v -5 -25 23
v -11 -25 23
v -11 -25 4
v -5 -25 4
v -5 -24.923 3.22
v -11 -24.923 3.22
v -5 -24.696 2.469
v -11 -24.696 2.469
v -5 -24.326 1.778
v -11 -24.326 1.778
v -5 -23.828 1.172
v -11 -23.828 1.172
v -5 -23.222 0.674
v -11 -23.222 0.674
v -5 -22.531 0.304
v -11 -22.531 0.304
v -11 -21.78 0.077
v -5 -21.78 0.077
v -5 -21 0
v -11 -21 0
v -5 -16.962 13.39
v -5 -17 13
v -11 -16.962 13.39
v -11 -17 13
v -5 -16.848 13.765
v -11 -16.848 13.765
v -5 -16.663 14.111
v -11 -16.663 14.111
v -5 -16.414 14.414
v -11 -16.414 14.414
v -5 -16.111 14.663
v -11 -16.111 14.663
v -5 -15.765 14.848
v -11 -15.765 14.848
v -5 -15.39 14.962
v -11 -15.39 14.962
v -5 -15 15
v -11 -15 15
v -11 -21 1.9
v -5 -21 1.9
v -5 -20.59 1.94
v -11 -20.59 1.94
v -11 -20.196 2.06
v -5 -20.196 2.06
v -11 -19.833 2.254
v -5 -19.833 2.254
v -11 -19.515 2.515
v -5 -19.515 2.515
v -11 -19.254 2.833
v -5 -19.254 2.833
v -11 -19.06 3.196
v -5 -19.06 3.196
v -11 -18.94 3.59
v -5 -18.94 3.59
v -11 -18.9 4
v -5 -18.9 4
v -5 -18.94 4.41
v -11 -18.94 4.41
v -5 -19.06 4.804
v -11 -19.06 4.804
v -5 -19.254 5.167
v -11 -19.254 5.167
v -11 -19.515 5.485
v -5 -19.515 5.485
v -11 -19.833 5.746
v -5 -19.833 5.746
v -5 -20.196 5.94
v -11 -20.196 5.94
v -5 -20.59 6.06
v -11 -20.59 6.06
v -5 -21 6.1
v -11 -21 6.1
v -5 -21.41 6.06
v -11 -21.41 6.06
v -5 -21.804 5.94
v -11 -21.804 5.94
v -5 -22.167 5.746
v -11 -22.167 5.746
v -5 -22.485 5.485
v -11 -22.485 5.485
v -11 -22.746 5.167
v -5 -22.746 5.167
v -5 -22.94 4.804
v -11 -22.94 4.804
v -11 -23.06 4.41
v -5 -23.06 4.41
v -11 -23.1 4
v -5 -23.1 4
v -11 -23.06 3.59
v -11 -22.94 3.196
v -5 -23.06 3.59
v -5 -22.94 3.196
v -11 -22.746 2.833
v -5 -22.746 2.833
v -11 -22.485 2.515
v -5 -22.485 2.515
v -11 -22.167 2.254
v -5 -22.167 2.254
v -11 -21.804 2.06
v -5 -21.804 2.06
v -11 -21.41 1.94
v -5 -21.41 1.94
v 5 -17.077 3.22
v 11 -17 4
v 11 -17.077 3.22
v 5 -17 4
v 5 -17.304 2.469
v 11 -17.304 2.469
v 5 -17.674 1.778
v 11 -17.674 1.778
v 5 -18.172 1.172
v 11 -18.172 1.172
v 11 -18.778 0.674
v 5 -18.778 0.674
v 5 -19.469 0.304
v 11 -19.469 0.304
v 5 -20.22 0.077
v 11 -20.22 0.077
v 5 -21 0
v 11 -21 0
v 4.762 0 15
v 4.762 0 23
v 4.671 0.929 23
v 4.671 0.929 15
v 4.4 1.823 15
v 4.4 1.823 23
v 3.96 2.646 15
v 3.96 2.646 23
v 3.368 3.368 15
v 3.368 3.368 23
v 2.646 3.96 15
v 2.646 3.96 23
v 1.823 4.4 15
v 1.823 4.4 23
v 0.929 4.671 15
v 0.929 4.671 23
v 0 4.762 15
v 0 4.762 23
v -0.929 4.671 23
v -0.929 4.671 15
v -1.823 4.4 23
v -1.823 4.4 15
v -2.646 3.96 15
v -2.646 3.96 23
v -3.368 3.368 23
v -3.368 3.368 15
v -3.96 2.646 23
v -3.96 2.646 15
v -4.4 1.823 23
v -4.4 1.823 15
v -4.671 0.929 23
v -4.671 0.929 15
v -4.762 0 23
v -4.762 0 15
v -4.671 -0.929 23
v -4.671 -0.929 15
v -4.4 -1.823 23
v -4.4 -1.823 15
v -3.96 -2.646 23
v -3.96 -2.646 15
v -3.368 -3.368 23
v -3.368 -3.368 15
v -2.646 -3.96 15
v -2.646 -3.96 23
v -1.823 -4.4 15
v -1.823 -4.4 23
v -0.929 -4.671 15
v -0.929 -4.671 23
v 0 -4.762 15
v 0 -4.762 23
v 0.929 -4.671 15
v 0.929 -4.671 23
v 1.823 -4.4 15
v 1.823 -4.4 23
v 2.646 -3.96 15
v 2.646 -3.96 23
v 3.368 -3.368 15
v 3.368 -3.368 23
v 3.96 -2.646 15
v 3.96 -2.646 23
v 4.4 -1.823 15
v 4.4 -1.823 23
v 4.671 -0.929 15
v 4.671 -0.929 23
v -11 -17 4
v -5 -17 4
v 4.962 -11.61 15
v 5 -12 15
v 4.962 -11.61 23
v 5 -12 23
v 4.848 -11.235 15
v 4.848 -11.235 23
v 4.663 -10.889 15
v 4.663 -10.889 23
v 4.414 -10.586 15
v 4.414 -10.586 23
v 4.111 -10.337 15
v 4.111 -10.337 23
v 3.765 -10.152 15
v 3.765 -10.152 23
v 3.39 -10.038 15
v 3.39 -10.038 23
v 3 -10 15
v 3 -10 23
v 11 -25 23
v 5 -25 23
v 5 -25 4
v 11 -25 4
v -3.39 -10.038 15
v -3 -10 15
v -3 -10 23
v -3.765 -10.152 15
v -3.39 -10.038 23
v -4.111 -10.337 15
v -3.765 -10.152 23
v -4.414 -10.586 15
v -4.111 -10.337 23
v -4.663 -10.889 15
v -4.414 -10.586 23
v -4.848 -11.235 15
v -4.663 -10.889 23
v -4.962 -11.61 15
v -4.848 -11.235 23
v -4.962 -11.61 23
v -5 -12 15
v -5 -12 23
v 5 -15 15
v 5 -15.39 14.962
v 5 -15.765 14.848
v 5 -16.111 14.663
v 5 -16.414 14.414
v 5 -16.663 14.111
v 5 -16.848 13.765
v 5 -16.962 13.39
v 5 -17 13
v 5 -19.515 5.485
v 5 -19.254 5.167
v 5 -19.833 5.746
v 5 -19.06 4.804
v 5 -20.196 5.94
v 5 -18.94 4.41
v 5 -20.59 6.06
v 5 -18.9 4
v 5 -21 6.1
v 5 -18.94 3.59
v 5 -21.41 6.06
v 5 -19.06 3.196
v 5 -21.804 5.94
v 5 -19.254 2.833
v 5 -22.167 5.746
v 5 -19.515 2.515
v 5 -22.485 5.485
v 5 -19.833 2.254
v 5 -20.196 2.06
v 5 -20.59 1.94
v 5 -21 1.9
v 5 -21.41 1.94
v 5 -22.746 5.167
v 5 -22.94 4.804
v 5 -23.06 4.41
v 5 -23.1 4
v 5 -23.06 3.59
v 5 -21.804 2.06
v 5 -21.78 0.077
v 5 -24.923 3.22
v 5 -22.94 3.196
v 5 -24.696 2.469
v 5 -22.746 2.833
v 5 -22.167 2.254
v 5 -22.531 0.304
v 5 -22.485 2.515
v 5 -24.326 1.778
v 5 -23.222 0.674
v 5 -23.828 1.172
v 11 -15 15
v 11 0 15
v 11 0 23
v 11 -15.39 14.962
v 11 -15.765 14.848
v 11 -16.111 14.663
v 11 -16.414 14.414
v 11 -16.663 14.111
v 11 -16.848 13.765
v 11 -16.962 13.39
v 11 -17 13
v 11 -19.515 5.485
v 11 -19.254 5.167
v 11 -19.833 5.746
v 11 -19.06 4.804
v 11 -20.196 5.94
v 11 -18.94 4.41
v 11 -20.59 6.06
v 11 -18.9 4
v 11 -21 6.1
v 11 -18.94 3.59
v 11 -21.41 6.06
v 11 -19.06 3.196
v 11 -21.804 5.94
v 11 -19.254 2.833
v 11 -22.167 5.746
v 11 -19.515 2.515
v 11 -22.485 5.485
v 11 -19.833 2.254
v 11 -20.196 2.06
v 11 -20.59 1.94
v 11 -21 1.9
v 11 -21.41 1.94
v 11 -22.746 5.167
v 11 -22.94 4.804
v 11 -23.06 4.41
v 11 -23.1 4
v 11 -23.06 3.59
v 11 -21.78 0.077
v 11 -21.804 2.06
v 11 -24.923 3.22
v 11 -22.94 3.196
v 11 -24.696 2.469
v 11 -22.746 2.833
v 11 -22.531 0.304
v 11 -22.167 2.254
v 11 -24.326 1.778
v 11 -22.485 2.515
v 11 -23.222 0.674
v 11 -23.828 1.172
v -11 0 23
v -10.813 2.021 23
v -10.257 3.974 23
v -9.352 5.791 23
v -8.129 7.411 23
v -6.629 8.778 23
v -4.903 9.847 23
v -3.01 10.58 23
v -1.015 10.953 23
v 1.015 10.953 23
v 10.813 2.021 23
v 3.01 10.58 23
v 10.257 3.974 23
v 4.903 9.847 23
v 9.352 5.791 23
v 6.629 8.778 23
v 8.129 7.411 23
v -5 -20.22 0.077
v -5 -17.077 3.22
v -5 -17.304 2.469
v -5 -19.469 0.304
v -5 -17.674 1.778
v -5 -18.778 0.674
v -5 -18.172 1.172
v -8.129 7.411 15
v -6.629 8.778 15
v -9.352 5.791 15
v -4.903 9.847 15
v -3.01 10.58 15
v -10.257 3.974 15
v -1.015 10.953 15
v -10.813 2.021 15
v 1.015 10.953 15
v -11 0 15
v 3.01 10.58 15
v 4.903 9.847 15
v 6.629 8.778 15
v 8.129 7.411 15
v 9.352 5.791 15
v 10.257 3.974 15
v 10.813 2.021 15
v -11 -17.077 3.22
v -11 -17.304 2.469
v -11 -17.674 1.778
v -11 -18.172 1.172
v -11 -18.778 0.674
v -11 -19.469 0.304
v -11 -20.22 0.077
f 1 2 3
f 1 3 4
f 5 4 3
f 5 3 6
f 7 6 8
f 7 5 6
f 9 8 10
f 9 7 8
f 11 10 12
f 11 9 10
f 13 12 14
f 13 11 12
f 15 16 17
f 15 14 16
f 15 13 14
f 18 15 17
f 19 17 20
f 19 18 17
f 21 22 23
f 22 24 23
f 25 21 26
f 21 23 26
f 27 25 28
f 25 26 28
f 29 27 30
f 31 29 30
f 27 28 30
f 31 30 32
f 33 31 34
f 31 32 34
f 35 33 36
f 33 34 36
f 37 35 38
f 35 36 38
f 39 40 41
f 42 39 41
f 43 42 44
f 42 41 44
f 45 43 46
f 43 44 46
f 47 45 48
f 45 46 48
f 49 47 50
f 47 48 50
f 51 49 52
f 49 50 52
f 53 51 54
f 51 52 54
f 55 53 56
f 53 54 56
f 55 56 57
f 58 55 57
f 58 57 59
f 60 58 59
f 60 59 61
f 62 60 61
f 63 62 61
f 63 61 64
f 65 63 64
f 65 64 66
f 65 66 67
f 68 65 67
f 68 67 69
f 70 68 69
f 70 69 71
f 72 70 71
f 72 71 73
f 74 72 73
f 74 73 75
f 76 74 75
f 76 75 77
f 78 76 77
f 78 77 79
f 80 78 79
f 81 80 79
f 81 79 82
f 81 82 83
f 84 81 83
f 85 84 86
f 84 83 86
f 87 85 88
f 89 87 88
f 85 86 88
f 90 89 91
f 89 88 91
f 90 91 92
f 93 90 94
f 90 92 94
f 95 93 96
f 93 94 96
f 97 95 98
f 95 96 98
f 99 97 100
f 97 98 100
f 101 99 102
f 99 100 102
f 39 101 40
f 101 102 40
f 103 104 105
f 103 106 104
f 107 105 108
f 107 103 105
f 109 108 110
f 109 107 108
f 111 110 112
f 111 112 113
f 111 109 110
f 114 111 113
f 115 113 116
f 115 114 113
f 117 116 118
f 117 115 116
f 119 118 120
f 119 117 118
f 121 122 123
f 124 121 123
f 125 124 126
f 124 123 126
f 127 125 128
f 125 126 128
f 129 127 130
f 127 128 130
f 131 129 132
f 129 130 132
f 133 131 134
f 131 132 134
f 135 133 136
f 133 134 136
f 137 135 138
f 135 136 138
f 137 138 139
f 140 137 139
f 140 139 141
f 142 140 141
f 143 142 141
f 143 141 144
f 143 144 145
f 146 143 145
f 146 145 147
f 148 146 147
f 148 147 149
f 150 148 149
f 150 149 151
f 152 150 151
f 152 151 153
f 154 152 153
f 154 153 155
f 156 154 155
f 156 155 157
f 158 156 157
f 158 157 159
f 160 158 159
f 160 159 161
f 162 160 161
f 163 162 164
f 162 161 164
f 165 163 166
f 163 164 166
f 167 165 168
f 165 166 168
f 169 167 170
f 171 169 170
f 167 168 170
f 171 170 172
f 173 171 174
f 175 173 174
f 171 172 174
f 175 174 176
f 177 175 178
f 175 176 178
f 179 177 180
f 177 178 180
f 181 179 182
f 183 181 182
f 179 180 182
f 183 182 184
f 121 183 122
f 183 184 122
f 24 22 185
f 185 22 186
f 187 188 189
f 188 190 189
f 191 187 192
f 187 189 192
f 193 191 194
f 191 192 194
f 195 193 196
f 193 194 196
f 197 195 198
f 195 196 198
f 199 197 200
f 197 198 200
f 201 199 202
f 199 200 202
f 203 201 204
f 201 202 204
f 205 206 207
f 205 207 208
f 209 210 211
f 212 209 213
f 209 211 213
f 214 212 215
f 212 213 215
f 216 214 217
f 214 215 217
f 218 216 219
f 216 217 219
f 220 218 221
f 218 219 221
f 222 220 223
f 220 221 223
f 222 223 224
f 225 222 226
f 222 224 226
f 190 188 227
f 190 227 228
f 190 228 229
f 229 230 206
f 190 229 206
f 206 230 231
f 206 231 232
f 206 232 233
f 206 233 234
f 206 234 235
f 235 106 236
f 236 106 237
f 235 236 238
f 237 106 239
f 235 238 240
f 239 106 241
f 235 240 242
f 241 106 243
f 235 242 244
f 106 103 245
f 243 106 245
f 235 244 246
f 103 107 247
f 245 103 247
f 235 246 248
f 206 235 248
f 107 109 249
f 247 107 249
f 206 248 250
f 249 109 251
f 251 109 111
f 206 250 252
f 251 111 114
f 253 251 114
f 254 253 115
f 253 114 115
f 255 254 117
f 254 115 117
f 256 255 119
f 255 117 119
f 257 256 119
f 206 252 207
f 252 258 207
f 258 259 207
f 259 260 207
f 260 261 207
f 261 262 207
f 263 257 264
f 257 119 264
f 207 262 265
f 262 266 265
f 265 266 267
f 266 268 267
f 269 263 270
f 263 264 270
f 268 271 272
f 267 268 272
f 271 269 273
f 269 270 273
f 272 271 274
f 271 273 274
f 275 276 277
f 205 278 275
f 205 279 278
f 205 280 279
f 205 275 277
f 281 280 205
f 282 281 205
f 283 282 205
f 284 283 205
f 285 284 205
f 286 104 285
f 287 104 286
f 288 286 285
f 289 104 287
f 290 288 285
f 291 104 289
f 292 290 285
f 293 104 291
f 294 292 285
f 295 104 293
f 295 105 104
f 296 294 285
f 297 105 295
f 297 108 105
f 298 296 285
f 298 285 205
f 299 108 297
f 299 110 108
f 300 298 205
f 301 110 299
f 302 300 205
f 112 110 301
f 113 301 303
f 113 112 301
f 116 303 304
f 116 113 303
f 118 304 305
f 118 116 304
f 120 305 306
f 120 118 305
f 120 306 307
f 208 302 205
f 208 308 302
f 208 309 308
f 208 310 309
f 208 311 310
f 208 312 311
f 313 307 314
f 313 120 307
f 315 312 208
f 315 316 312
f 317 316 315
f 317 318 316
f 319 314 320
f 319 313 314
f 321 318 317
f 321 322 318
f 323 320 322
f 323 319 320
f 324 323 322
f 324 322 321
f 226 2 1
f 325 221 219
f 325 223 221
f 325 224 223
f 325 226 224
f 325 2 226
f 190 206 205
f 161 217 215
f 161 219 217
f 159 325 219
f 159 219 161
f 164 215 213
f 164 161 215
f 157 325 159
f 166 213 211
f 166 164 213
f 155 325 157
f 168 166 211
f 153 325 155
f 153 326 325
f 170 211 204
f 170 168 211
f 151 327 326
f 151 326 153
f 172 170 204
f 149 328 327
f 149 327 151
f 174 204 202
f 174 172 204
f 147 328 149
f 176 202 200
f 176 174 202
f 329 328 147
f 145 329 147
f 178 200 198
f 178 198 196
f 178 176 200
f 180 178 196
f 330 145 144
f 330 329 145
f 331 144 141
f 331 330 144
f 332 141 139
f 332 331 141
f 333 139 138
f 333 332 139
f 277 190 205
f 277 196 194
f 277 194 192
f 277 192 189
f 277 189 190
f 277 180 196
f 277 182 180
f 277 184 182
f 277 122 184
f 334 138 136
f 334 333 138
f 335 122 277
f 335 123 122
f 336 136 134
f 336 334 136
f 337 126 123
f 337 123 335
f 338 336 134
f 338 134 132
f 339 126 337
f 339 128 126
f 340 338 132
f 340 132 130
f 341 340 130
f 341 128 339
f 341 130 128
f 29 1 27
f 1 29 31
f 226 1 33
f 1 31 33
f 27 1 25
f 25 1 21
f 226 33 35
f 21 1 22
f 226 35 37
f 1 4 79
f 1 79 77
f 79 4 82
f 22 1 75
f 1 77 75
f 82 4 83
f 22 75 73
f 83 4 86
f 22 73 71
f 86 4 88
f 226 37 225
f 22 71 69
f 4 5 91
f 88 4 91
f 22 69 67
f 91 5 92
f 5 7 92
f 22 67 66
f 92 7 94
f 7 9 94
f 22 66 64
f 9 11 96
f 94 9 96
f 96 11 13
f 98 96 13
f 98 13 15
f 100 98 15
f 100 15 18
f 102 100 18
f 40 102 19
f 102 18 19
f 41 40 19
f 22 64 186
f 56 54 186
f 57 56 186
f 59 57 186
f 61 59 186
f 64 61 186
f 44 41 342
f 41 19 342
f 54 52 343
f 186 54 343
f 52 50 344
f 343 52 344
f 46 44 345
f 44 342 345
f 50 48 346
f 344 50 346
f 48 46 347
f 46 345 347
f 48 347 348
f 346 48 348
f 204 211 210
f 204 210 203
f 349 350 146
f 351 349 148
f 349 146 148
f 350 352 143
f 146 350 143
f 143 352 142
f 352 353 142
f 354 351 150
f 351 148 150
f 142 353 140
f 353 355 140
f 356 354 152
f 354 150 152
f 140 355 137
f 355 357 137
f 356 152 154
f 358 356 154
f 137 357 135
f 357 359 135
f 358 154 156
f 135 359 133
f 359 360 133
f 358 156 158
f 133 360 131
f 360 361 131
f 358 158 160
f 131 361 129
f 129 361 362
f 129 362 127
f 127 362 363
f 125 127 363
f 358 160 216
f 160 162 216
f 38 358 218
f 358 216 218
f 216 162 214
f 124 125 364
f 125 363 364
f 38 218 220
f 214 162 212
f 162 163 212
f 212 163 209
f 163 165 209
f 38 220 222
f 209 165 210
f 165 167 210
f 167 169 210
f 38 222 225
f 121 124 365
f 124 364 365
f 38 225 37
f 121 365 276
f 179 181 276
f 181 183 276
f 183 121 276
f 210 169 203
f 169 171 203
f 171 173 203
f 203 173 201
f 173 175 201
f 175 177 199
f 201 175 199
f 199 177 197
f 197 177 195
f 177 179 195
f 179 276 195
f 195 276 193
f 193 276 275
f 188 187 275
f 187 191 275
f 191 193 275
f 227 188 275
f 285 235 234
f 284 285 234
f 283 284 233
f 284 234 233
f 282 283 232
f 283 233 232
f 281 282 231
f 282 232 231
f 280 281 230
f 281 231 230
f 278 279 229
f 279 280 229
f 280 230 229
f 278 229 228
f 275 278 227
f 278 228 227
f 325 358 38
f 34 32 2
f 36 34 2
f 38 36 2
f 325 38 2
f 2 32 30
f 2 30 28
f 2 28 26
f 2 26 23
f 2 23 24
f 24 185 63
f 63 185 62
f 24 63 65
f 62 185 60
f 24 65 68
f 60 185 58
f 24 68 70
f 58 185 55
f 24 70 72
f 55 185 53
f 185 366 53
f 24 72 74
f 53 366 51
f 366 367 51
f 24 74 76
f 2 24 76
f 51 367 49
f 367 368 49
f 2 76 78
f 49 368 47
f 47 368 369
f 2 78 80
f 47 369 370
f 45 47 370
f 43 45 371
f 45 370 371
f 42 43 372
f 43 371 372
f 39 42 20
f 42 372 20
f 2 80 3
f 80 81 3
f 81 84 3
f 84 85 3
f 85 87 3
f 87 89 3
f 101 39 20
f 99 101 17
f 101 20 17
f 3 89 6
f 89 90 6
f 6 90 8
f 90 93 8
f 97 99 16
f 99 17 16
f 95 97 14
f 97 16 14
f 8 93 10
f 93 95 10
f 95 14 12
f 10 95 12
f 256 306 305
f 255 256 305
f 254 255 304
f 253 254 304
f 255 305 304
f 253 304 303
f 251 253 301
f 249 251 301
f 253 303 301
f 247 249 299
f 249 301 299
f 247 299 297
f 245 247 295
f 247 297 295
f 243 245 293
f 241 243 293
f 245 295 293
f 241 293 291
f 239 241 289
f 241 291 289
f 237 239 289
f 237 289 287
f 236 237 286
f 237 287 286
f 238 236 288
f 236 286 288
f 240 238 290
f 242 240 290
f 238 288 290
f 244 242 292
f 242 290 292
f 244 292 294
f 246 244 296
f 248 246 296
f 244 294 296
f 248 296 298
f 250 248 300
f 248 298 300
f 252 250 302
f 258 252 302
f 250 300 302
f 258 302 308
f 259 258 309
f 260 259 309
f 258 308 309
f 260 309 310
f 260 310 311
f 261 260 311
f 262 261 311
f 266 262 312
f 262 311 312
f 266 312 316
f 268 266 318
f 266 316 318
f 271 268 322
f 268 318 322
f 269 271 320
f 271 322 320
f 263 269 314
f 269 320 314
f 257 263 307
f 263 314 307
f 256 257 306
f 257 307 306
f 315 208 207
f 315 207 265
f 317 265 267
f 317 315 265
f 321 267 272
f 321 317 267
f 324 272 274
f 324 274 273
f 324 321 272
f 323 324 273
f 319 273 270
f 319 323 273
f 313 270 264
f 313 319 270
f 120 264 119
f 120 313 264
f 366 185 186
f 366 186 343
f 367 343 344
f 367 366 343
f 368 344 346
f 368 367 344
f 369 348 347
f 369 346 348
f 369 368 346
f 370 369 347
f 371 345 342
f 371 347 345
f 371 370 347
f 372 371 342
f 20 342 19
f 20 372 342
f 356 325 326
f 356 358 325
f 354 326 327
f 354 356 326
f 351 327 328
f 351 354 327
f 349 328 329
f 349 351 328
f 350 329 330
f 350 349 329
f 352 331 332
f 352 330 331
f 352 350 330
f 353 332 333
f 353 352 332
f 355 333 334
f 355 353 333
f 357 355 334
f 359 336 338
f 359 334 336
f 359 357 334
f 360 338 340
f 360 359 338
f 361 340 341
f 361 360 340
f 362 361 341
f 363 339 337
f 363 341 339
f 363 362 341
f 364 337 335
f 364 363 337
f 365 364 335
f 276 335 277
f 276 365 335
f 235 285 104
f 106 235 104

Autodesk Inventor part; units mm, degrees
ref_plane "YZ Plane" through (0, 0, 0) normal (1, 0, 0) x (0, 1, 0)
ref_plane "XZ Plane" through (0, 0, 0) normal (0, 1, 0) x (-1, 0, 0)
ref_plane "XY Plane" through (0, 0, 0) normal (0, 0, 1) x (1, 0, 0)
sketch "Sketch1" plane through (0, 0, 0) normal (0, 0, 1) x (1, 0, 0)
  circle A0 centre (0, 0) radius 5
  circle A1 centre (0, 0) radius 11
  line L0 (-11, 0) -> (-11, -25)
  line L1 (11, 0) -> (11, -25)
  line L2 (0, 0) -> (0, -54.7816)
  line L3 (-11, -25) -> (-5, -25)
  line L4 (-5, -25) -> (-5, -10)
  line L5 (5, -10) -> (5, -25)
  line L6 (5, -25) -> (11, -25)
  line L7 (-5, -10) -> (5, -10)
  dimension "d0" = 10
  dimension "d1" = 22
  dimension "d4" = 10
  dimension "d6" = 15
  dimension "d22" = 6
  dimension "d23" = 6
extrude "Extrusion1" add sketch "Sketch1" along normal blind 23 contours A0 | A1 L7 | L1 L6 L5 L7 A1 | A1 L7 L4 L3 L0
sketch "Sketch2" plane through (11, -25, 0) normal (1, 0, 0) x (0, 0, -1)
  circle A0 centre (-4, 4) radius 2.1
  line L0 (0, 0) -> (0, 25) projected
  line L1 (0, 25) -> (-23, 25) projected
  line L2 (-23, 0) -> (-23, 25) projected
  line L3 (0, 0) -> (-23, 0) projected
  dimension "d9" = 4.2
  dimension "d10" = 4
  dimension "d20" = 4
extrude "Extrusion2" cut sketch "Sketch2" against normal through all contours A0
fillet "Fillet1" radius 2 2 edges at (-5, -10, 11.5) (5, -10, 11.5)
sketch "Sketch5" plane through (11, -25, 0) normal (1, 0, 0) x (0, 0, -1)
  circle A0 centre (-4, 4) radius 2.1 projected
  line L0 (0, 0) -> (0, 25) projected
  line L1 (0, 25) -> (-23, 25) projected
  line L2 (-23, 0) -> (-23, 25) projected
  line L3 (0, 0) -> (-23, 0) projected
  line L4 (-23, 15) -> (0, 15) projected
  line L5 (0, 15) -> (-23, 15) projected
  line L6 (-15, 8) -> (0, 8)
  line L7 (0, 8) -> (0, 53.1691)
  line L8 (0, 53.1691) -> (-15, 53.1691)
  line L9 (-15, 53.1691) -> (-15, 8)
  line L10 (0, 0) -> (0, 25) projected
  line L11 (0, 25) -> (0, 25) projected
  line L12 (0, 25) -> (-23, 25) projected
  line L13 (-23, 25) -> (-23, 25) projected
  line L14 (0, 25) -> (-23, 25) projected
  dimension "d28" = 4
  dimension "d29" = 15
extrude "Extrusion5" cut sketch "Sketch5" against normal through all contours L6 L9 L4 L0 | L4 L9 L1 L0 | L1 L9 L8 L7
fillet "Fillet2" radius 4 4 edges at (8, -25, 0) (8, -17, 0) (-8, -17, 0) (-8, -25, 0)
fillet "Fillet3" radius 2 2 edges at (8, -17, 15) (-8, -17, 15)
sketch "Sketch6" plane through (0, 0, 23) normal (0, 0, 1) x (1, 0, 0)
  circle A0 centre (0, 0) radius 4.7625
  dimension "d34" = 9.525
extrude "Extrusion6" cut sketch "Sketch6" against normal up to next
properties part number "Piston_Holder" material "Acetal Resin, Black"
